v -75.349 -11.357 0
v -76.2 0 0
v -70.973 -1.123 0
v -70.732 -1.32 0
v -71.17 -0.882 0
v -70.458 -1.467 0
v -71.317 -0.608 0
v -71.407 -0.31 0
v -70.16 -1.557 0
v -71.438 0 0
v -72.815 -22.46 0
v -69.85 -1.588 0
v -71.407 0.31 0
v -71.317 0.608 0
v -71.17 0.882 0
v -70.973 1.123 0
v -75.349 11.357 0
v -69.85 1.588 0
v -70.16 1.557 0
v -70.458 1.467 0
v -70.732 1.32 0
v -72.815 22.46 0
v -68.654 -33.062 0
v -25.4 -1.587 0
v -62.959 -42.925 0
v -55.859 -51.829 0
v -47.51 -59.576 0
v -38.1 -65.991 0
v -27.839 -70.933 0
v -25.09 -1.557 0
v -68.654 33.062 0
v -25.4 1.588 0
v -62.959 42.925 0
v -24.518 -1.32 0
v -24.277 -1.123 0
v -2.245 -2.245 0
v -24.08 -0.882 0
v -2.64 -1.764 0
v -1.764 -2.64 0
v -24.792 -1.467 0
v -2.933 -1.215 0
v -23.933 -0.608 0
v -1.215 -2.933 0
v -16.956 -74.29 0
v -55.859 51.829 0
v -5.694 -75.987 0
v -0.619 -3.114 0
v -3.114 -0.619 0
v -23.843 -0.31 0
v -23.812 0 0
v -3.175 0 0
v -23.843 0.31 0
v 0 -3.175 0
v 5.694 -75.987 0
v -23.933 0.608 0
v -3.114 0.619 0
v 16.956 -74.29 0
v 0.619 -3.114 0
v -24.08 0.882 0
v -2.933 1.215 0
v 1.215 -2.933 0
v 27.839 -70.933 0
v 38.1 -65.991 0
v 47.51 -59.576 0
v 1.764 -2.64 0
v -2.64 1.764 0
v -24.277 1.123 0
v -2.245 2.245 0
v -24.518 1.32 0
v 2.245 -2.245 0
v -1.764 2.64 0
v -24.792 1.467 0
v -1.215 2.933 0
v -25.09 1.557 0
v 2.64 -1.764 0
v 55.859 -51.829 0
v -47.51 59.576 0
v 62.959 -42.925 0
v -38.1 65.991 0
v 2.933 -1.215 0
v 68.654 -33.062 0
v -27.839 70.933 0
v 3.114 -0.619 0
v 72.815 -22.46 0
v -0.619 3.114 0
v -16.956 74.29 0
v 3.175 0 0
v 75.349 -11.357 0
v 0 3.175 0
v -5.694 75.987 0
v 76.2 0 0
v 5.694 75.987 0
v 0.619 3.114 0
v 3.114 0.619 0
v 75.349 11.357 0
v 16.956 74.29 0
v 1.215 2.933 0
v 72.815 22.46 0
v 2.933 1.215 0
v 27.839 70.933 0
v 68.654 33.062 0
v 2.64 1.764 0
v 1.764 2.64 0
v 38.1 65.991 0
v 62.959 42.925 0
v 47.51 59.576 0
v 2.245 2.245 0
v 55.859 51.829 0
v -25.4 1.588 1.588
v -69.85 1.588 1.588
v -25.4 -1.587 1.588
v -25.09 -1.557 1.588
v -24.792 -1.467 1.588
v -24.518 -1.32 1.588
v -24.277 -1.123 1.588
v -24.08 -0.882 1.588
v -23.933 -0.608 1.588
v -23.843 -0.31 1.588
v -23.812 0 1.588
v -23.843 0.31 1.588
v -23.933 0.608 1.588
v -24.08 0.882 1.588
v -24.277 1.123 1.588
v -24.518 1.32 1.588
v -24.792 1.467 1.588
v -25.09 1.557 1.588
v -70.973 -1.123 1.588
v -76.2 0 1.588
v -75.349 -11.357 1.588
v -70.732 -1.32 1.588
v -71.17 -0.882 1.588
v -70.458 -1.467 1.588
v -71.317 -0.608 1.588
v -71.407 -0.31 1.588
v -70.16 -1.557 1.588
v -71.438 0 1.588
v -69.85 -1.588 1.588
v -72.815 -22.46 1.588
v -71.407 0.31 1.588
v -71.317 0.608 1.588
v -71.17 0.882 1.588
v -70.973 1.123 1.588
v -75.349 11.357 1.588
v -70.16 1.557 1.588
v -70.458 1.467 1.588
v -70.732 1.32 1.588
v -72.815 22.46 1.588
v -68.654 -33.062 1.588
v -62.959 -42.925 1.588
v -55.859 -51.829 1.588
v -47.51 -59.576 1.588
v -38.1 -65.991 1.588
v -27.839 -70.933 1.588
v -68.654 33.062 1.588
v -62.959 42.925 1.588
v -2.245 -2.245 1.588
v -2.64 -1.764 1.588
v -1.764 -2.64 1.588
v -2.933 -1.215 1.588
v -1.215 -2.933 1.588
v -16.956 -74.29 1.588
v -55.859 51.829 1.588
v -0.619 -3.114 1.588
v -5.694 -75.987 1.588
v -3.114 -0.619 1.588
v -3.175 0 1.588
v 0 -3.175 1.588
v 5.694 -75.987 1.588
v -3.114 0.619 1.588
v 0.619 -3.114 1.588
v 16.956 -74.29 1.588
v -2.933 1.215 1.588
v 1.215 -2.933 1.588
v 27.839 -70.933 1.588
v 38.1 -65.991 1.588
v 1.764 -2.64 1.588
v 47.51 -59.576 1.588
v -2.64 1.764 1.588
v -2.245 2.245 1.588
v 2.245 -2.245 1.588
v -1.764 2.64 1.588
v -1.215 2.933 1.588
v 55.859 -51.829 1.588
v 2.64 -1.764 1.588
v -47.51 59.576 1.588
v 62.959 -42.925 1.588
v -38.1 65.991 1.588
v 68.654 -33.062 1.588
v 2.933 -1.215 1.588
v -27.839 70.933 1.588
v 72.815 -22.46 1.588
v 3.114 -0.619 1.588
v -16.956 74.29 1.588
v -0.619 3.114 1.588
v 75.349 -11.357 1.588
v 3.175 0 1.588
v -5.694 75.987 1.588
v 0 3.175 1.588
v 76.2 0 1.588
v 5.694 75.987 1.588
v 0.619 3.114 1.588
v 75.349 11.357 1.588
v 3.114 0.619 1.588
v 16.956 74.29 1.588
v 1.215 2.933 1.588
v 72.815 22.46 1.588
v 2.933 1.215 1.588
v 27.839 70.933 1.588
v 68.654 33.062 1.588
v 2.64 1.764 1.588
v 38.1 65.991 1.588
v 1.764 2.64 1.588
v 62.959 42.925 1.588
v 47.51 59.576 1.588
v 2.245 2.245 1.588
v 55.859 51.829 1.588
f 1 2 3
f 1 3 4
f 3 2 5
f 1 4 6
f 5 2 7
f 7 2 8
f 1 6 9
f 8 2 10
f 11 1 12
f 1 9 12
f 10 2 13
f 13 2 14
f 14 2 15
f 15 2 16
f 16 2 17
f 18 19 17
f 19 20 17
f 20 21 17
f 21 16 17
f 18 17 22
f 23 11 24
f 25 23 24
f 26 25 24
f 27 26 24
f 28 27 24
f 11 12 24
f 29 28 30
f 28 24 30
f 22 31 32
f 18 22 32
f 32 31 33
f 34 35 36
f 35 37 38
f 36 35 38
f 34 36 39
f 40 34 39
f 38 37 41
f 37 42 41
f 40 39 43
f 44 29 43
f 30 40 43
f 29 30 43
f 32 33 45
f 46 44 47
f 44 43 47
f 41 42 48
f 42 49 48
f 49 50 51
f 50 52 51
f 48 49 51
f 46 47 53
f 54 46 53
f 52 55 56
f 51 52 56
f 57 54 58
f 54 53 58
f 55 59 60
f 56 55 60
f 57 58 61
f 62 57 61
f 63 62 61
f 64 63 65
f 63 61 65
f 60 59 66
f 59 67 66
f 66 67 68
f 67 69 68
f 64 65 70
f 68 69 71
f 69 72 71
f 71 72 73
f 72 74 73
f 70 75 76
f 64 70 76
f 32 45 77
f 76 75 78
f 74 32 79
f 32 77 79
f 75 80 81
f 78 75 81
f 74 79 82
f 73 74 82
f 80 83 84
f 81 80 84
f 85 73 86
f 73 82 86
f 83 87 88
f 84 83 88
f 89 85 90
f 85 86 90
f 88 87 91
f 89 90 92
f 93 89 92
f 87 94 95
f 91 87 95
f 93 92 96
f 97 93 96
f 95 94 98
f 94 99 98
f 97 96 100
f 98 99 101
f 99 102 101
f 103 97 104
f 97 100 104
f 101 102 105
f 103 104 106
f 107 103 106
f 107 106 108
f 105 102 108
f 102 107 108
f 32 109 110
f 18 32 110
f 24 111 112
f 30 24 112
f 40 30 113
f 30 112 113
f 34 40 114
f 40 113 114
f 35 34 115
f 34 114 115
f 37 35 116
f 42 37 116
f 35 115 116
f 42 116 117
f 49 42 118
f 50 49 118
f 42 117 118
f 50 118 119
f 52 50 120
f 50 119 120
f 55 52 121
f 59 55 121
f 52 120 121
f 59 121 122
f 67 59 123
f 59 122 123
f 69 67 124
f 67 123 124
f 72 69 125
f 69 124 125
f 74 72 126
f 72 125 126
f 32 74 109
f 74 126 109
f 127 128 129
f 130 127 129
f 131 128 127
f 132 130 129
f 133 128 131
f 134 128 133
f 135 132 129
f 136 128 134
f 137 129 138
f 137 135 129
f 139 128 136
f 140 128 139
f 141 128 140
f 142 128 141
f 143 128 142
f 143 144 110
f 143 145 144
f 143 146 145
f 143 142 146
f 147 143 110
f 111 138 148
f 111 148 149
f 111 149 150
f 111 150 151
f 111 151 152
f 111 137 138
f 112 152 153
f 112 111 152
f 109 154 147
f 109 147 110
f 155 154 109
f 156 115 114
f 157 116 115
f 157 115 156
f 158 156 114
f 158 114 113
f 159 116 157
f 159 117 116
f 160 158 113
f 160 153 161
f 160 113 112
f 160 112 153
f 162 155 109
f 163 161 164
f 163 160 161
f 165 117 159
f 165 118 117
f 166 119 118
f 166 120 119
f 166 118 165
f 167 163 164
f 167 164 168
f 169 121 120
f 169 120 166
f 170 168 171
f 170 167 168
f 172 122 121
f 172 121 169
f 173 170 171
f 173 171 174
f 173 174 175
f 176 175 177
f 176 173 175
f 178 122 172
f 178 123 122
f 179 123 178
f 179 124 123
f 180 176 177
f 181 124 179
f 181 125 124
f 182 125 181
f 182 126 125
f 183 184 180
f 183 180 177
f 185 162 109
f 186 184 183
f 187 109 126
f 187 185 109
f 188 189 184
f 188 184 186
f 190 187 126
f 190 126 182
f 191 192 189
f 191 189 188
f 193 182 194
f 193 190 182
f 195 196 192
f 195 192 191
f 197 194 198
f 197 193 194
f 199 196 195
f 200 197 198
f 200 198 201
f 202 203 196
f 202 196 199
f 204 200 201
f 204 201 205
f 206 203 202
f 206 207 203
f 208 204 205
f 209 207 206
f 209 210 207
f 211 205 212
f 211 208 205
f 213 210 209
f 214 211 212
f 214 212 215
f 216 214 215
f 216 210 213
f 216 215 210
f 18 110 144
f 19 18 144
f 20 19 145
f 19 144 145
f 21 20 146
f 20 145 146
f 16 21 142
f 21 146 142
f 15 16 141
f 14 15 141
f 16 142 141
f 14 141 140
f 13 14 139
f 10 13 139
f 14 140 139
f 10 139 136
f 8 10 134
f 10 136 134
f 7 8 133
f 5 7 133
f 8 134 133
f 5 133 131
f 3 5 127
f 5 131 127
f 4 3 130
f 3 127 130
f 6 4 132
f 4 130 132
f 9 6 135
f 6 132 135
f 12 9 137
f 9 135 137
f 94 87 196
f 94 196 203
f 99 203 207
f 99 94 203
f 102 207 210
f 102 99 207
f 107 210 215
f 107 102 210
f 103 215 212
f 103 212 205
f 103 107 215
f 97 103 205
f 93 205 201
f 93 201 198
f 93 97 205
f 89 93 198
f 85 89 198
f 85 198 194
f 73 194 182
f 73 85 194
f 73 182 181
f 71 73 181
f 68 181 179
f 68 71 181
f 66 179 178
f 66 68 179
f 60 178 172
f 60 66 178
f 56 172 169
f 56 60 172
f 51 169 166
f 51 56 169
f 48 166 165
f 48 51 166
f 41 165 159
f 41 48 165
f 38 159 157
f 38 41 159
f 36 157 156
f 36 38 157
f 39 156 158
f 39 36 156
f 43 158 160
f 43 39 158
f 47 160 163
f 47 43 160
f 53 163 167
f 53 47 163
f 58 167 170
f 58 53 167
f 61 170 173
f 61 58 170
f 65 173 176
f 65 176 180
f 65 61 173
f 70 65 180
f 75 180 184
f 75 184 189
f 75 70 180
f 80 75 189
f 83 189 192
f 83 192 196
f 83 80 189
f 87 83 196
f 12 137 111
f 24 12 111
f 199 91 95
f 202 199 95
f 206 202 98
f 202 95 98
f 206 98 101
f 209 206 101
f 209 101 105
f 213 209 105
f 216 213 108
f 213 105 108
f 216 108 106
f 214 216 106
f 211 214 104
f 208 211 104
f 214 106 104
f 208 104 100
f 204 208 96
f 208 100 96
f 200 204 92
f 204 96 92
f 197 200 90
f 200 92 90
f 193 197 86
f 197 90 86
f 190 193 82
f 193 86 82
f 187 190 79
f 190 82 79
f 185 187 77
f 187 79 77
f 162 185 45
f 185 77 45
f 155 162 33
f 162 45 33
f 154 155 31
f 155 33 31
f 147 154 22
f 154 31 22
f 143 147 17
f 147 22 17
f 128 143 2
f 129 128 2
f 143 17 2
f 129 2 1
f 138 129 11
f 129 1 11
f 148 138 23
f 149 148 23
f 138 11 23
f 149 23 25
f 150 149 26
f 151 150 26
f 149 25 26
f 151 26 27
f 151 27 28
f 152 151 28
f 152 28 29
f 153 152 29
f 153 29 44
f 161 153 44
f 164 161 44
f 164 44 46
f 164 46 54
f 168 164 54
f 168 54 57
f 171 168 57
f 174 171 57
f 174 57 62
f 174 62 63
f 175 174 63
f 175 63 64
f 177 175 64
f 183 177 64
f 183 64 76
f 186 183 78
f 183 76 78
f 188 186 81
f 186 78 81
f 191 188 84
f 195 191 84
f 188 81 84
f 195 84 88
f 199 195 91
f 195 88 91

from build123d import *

# Parameters (mm, degrees)
F0_R     = 76.2
F0_R_2   = 3.175
F1_DEPTH = 1.5875
F3_DEPTH = 25.4


with BuildPart() as f1:
    # F0 (on Top) → F1 (new body)
    with BuildSketch(Plane.XY):
        Circle(F0_R)
        Circle(F0_R_2, mode=Mode.SUBTRACT)
    extrude(amount=F1_DEPTH)

    # F2 (on face) → F3 (cut)
    with BuildSketch(Plane.XY.offset(1.5875)):
        with BuildLine():
            Line((-25.4, 1.5875), (-69.85, 1.5875))
            ThreePointArc((-69.85, 1.5875), (-71.4375, 0), (-69.85, -1.5875))
            Line((-69.85, -1.5875), (-25.4, -1.5875))
            ThreePointArc((-25.4, -1.5875), (-23.8125, 0), (-25.4, 1.5875))
        make_face()
    extrude(amount=-F3_DEPTH, mode=Mode.SUBTRACT)


solid = f1.part
